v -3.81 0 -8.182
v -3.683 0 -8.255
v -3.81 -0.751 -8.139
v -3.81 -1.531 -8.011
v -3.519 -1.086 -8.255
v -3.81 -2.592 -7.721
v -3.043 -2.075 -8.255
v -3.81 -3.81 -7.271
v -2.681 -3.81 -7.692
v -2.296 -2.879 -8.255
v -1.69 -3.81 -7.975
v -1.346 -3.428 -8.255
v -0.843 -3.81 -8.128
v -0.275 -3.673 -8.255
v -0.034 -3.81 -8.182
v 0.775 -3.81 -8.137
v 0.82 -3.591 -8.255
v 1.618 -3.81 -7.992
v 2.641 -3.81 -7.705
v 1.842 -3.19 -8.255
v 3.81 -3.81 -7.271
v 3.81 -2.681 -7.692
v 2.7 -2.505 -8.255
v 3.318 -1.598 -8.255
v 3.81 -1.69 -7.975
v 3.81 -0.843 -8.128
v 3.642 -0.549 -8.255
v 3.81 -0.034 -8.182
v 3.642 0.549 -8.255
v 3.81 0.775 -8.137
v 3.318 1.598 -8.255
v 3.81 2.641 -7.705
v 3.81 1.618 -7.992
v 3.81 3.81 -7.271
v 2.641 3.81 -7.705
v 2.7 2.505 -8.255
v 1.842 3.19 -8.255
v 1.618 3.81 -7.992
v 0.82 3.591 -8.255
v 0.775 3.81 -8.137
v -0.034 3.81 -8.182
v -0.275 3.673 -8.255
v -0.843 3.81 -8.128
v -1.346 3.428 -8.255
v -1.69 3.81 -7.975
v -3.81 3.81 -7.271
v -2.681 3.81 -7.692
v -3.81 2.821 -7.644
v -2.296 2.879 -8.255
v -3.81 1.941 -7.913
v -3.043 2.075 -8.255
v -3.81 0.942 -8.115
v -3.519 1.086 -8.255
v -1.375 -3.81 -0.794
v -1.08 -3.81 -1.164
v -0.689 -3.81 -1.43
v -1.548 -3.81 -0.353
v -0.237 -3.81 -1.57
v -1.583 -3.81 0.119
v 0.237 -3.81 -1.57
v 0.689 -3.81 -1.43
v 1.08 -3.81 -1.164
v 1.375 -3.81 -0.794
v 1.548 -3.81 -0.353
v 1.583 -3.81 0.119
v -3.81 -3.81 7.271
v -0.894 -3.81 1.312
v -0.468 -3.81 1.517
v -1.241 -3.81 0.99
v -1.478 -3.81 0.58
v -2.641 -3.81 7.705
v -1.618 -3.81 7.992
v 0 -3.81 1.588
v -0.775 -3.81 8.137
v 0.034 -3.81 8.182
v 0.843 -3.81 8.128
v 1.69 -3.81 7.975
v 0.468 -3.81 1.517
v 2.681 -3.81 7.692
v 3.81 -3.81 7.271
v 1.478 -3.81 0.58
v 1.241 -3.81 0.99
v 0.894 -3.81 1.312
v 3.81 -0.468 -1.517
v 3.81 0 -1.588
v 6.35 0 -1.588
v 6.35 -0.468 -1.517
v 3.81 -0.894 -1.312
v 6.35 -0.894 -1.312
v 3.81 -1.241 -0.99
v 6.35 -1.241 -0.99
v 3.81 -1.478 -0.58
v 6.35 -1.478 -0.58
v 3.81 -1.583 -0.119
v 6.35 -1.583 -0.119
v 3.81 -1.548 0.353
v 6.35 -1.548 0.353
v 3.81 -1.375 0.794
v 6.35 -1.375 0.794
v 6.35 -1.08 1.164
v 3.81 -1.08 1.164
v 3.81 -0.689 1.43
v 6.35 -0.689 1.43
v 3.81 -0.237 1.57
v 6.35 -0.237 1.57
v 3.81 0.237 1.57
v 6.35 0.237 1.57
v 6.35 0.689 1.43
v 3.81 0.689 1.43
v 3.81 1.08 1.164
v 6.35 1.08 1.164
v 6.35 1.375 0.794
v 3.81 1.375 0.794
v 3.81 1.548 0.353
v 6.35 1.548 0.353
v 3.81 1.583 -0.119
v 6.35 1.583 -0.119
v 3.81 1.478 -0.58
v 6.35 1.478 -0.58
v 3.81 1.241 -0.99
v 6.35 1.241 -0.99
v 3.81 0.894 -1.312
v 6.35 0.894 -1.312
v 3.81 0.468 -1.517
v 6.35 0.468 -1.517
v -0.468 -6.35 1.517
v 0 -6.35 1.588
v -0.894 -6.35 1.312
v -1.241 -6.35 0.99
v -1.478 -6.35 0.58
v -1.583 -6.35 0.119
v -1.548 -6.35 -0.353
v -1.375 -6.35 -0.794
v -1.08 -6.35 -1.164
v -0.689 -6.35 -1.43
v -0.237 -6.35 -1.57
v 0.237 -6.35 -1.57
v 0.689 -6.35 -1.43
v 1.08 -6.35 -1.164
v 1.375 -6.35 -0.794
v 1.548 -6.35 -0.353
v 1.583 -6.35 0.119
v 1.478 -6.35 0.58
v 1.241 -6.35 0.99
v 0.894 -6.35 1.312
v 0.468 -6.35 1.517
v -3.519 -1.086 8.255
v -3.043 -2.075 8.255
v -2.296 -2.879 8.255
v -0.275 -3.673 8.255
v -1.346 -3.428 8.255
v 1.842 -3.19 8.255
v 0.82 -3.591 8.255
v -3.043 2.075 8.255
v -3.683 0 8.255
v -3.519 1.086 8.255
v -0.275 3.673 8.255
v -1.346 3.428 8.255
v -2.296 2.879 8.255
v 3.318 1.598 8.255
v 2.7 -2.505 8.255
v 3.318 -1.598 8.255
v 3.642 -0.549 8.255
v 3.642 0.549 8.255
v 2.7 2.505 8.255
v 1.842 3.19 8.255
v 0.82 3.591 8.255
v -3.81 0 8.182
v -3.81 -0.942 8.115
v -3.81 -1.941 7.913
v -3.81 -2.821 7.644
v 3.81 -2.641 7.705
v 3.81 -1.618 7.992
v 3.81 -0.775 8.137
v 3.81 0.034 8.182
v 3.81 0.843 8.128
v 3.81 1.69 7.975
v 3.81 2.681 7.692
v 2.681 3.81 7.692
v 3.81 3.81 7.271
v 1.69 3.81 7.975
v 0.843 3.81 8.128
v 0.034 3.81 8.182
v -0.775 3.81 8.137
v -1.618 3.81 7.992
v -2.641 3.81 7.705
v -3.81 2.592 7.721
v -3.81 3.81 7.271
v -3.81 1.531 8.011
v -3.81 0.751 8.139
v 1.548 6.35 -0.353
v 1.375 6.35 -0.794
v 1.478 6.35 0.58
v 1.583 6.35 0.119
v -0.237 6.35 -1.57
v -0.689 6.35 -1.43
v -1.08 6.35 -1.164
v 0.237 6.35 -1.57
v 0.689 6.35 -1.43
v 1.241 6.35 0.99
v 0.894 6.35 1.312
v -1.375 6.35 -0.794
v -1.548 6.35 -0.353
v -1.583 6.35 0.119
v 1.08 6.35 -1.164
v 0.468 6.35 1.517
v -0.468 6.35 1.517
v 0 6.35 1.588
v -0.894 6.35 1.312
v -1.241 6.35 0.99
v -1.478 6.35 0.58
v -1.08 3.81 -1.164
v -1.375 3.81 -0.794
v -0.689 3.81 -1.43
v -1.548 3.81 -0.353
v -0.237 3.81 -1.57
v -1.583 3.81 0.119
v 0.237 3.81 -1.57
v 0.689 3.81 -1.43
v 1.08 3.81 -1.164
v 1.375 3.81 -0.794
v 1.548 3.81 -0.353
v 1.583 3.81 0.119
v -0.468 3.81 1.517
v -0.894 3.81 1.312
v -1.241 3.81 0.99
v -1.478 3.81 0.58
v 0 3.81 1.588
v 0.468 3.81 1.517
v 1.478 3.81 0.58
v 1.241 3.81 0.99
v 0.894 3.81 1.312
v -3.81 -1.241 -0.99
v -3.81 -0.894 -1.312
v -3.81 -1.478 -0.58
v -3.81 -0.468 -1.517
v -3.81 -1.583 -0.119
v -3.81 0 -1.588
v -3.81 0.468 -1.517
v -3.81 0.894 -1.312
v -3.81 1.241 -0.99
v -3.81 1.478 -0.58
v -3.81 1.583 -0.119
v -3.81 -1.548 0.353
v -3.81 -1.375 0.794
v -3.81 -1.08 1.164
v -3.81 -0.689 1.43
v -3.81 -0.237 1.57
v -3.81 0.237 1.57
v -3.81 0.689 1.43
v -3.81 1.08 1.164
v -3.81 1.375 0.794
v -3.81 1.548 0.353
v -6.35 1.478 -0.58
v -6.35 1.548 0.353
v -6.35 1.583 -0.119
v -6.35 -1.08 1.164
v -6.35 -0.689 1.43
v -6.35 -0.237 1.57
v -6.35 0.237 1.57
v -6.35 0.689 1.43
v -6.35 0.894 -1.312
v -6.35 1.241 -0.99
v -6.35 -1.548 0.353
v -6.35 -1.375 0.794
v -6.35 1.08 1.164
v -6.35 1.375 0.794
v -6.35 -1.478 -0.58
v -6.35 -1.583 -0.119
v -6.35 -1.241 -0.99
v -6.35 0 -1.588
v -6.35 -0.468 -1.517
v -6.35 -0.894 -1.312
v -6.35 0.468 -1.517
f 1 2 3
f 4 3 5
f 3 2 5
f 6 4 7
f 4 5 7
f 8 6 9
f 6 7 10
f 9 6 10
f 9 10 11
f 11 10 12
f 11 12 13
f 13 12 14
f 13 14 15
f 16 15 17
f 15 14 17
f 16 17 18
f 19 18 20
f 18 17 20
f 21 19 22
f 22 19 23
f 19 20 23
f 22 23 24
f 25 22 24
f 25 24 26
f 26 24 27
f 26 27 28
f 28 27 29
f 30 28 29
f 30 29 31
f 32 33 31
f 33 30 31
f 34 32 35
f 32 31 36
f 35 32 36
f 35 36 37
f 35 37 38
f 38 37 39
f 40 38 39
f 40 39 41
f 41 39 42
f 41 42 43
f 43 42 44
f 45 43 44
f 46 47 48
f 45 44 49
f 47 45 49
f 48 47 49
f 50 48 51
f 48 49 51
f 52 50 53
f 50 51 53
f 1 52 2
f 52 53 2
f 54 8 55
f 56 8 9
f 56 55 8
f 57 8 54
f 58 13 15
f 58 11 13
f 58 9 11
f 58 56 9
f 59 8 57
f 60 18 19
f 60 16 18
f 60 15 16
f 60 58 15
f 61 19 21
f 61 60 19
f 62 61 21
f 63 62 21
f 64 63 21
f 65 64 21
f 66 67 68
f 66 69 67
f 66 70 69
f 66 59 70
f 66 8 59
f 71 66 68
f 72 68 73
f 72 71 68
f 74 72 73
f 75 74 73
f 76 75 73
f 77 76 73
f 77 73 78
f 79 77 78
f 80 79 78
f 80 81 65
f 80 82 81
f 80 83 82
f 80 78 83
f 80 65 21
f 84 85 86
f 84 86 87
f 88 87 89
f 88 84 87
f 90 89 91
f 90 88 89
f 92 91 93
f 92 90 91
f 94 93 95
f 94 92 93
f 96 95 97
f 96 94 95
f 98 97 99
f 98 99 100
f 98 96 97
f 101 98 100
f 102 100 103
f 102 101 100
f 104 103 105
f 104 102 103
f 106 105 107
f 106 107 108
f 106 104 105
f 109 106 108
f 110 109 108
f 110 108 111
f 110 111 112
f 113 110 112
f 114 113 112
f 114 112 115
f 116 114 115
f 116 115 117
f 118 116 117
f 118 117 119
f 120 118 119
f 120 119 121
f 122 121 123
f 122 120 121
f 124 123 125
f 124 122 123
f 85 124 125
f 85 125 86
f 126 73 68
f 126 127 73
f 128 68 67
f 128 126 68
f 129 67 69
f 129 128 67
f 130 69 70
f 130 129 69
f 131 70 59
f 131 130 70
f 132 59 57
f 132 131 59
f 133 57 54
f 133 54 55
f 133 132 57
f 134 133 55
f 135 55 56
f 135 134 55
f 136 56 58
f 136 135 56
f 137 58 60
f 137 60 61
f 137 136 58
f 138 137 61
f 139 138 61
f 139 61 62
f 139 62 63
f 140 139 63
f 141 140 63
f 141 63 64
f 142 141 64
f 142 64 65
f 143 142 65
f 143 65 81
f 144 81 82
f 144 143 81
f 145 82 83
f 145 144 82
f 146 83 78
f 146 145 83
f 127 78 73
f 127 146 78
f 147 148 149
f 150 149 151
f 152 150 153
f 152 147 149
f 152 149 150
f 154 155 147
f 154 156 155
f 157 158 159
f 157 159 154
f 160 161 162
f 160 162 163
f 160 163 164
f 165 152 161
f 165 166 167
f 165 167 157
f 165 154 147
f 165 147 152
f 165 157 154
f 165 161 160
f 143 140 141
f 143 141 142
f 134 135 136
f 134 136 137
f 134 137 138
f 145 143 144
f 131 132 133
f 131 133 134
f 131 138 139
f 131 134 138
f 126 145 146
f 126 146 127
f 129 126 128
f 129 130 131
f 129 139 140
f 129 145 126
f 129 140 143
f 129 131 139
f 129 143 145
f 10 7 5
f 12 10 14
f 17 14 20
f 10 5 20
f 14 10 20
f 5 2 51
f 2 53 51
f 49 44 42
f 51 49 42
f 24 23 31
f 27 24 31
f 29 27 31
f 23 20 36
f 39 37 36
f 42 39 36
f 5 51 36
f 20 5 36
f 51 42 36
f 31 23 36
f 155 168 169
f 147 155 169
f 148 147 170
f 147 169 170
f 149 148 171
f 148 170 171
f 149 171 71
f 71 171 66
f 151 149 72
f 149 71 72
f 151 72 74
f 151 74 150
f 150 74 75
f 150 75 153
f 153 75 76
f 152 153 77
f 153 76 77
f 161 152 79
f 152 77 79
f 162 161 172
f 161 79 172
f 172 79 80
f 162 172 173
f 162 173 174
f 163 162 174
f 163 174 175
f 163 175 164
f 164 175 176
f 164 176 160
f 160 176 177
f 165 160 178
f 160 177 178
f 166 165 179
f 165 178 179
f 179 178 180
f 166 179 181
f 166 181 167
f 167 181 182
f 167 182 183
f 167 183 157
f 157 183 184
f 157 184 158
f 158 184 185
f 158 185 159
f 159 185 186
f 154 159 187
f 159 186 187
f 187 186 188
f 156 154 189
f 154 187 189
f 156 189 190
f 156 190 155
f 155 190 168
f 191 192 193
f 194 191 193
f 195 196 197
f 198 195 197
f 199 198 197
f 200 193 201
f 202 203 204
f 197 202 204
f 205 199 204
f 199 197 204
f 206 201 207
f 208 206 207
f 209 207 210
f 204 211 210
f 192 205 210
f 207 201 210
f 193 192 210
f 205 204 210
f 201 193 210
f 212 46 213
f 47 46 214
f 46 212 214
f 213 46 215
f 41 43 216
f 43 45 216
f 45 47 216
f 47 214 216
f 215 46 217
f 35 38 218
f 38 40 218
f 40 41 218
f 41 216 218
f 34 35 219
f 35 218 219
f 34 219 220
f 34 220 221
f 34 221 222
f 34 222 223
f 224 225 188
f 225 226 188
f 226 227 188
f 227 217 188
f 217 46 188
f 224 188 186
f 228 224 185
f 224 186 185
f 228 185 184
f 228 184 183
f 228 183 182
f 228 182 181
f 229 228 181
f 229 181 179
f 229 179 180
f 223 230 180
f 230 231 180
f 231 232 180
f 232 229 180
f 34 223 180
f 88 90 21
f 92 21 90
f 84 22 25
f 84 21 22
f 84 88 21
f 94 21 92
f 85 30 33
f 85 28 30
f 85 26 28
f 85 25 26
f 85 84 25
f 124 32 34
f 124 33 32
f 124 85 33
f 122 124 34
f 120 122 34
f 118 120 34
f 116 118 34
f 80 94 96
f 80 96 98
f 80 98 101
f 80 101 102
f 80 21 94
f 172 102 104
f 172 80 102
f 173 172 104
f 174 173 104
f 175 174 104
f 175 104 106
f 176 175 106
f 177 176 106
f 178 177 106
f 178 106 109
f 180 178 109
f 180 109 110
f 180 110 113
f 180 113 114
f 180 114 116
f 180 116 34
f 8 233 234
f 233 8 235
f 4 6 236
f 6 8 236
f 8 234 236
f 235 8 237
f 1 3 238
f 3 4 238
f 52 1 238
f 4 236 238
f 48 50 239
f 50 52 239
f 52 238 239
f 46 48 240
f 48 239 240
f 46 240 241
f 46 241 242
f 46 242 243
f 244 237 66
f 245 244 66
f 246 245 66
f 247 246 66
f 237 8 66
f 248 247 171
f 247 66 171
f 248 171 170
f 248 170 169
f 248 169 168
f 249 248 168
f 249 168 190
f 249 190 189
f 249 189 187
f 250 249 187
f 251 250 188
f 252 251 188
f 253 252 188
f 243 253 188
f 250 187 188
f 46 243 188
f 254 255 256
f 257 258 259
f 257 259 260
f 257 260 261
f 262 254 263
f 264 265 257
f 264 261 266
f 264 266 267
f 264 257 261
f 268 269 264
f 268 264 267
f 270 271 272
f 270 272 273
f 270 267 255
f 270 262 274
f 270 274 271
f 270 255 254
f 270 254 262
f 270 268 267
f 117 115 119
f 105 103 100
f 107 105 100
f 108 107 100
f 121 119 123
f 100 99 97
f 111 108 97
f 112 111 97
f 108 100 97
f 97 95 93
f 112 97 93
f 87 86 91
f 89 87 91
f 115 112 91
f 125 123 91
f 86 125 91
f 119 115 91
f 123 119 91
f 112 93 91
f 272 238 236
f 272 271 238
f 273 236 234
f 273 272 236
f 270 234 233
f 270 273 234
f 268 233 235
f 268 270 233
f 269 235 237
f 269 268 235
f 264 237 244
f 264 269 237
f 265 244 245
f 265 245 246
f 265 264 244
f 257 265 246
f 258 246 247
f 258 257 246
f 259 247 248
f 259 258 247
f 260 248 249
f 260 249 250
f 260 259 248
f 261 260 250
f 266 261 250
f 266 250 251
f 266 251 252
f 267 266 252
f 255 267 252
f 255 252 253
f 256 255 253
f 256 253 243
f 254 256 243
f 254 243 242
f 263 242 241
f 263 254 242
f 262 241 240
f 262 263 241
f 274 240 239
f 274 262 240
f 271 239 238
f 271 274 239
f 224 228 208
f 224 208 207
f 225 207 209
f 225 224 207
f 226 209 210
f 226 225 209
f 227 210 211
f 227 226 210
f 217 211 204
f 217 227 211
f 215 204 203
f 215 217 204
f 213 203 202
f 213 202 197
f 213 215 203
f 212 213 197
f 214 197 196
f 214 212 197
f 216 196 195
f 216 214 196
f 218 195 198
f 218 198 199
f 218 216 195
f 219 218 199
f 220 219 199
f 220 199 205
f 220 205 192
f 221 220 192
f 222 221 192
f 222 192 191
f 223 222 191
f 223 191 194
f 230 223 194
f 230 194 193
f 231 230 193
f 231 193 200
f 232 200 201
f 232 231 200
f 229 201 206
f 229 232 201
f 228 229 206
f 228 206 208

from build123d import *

# Parameters (mm, degrees)
SKETCH1_W           = 7.62
SKETCH1_H           = 7.62
BOSS_EXTRUDE1_DEPTH = 8.255
SKETCH3_R           = 1.5875
BOSS_EXTRUDE2_DEPTH = 6.35
SKETCH4_R           = 1.5875
BOSS_EXTRUDE3_DEPTH = 6.35


with BuildPart() as part:
    # Sketch1 → Boss-Extrude1 (new, symmetric)
    with BuildSketch(Plane.XY):
        Rectangle(SKETCH1_W, SKETCH1_H)
    extrude(amount=BOSS_EXTRUDE1_DEPTH, both=True)

    # Sketch2 → Cut-Revolve2 (revolve, cut)
    with BuildSketch(Plane(origin=(0, 0, 0), x_dir=(-1, 0, 0), z_dir=(0, -1, 0)), mode=Mode.PRIVATE) as cut_revolve2_sk:
        Polygon((-3.683, 8.255), (-12.573, 8.255), (-12.573, -8.255), (-3.683, -8.255), (-11.303, -3.855590949), (-11.303, 3.855590949), align=None)
    revolve(cut_revolve2_sk.sketch.rotate(Axis((0, 0, -8.255), (0, 0, 1)), 180), axis=Axis((0, 0, -8.255), (0, 0, 1)), mode=Mode.SUBTRACT)

    # Sketch3 → Boss-Extrude2 (add, symmetric)
    with BuildSketch(Plane.XZ):
        with Locations(Location((0, 0, 0), (0, 0, 90))):
            Circle(SKETCH3_R)
    extrude(amount=BOSS_EXTRUDE2_DEPTH, both=True)

    # Sketch4 → Boss-Extrude3 (add, symmetric)
    with BuildSketch(Plane.ZY):
        with Locations(Location((0, 0, 0), (0, 0, 180))):
            Circle(SKETCH4_R)
    extrude(amount=BOSS_EXTRUDE3_DEPTH, both=True)


solid = part.part
